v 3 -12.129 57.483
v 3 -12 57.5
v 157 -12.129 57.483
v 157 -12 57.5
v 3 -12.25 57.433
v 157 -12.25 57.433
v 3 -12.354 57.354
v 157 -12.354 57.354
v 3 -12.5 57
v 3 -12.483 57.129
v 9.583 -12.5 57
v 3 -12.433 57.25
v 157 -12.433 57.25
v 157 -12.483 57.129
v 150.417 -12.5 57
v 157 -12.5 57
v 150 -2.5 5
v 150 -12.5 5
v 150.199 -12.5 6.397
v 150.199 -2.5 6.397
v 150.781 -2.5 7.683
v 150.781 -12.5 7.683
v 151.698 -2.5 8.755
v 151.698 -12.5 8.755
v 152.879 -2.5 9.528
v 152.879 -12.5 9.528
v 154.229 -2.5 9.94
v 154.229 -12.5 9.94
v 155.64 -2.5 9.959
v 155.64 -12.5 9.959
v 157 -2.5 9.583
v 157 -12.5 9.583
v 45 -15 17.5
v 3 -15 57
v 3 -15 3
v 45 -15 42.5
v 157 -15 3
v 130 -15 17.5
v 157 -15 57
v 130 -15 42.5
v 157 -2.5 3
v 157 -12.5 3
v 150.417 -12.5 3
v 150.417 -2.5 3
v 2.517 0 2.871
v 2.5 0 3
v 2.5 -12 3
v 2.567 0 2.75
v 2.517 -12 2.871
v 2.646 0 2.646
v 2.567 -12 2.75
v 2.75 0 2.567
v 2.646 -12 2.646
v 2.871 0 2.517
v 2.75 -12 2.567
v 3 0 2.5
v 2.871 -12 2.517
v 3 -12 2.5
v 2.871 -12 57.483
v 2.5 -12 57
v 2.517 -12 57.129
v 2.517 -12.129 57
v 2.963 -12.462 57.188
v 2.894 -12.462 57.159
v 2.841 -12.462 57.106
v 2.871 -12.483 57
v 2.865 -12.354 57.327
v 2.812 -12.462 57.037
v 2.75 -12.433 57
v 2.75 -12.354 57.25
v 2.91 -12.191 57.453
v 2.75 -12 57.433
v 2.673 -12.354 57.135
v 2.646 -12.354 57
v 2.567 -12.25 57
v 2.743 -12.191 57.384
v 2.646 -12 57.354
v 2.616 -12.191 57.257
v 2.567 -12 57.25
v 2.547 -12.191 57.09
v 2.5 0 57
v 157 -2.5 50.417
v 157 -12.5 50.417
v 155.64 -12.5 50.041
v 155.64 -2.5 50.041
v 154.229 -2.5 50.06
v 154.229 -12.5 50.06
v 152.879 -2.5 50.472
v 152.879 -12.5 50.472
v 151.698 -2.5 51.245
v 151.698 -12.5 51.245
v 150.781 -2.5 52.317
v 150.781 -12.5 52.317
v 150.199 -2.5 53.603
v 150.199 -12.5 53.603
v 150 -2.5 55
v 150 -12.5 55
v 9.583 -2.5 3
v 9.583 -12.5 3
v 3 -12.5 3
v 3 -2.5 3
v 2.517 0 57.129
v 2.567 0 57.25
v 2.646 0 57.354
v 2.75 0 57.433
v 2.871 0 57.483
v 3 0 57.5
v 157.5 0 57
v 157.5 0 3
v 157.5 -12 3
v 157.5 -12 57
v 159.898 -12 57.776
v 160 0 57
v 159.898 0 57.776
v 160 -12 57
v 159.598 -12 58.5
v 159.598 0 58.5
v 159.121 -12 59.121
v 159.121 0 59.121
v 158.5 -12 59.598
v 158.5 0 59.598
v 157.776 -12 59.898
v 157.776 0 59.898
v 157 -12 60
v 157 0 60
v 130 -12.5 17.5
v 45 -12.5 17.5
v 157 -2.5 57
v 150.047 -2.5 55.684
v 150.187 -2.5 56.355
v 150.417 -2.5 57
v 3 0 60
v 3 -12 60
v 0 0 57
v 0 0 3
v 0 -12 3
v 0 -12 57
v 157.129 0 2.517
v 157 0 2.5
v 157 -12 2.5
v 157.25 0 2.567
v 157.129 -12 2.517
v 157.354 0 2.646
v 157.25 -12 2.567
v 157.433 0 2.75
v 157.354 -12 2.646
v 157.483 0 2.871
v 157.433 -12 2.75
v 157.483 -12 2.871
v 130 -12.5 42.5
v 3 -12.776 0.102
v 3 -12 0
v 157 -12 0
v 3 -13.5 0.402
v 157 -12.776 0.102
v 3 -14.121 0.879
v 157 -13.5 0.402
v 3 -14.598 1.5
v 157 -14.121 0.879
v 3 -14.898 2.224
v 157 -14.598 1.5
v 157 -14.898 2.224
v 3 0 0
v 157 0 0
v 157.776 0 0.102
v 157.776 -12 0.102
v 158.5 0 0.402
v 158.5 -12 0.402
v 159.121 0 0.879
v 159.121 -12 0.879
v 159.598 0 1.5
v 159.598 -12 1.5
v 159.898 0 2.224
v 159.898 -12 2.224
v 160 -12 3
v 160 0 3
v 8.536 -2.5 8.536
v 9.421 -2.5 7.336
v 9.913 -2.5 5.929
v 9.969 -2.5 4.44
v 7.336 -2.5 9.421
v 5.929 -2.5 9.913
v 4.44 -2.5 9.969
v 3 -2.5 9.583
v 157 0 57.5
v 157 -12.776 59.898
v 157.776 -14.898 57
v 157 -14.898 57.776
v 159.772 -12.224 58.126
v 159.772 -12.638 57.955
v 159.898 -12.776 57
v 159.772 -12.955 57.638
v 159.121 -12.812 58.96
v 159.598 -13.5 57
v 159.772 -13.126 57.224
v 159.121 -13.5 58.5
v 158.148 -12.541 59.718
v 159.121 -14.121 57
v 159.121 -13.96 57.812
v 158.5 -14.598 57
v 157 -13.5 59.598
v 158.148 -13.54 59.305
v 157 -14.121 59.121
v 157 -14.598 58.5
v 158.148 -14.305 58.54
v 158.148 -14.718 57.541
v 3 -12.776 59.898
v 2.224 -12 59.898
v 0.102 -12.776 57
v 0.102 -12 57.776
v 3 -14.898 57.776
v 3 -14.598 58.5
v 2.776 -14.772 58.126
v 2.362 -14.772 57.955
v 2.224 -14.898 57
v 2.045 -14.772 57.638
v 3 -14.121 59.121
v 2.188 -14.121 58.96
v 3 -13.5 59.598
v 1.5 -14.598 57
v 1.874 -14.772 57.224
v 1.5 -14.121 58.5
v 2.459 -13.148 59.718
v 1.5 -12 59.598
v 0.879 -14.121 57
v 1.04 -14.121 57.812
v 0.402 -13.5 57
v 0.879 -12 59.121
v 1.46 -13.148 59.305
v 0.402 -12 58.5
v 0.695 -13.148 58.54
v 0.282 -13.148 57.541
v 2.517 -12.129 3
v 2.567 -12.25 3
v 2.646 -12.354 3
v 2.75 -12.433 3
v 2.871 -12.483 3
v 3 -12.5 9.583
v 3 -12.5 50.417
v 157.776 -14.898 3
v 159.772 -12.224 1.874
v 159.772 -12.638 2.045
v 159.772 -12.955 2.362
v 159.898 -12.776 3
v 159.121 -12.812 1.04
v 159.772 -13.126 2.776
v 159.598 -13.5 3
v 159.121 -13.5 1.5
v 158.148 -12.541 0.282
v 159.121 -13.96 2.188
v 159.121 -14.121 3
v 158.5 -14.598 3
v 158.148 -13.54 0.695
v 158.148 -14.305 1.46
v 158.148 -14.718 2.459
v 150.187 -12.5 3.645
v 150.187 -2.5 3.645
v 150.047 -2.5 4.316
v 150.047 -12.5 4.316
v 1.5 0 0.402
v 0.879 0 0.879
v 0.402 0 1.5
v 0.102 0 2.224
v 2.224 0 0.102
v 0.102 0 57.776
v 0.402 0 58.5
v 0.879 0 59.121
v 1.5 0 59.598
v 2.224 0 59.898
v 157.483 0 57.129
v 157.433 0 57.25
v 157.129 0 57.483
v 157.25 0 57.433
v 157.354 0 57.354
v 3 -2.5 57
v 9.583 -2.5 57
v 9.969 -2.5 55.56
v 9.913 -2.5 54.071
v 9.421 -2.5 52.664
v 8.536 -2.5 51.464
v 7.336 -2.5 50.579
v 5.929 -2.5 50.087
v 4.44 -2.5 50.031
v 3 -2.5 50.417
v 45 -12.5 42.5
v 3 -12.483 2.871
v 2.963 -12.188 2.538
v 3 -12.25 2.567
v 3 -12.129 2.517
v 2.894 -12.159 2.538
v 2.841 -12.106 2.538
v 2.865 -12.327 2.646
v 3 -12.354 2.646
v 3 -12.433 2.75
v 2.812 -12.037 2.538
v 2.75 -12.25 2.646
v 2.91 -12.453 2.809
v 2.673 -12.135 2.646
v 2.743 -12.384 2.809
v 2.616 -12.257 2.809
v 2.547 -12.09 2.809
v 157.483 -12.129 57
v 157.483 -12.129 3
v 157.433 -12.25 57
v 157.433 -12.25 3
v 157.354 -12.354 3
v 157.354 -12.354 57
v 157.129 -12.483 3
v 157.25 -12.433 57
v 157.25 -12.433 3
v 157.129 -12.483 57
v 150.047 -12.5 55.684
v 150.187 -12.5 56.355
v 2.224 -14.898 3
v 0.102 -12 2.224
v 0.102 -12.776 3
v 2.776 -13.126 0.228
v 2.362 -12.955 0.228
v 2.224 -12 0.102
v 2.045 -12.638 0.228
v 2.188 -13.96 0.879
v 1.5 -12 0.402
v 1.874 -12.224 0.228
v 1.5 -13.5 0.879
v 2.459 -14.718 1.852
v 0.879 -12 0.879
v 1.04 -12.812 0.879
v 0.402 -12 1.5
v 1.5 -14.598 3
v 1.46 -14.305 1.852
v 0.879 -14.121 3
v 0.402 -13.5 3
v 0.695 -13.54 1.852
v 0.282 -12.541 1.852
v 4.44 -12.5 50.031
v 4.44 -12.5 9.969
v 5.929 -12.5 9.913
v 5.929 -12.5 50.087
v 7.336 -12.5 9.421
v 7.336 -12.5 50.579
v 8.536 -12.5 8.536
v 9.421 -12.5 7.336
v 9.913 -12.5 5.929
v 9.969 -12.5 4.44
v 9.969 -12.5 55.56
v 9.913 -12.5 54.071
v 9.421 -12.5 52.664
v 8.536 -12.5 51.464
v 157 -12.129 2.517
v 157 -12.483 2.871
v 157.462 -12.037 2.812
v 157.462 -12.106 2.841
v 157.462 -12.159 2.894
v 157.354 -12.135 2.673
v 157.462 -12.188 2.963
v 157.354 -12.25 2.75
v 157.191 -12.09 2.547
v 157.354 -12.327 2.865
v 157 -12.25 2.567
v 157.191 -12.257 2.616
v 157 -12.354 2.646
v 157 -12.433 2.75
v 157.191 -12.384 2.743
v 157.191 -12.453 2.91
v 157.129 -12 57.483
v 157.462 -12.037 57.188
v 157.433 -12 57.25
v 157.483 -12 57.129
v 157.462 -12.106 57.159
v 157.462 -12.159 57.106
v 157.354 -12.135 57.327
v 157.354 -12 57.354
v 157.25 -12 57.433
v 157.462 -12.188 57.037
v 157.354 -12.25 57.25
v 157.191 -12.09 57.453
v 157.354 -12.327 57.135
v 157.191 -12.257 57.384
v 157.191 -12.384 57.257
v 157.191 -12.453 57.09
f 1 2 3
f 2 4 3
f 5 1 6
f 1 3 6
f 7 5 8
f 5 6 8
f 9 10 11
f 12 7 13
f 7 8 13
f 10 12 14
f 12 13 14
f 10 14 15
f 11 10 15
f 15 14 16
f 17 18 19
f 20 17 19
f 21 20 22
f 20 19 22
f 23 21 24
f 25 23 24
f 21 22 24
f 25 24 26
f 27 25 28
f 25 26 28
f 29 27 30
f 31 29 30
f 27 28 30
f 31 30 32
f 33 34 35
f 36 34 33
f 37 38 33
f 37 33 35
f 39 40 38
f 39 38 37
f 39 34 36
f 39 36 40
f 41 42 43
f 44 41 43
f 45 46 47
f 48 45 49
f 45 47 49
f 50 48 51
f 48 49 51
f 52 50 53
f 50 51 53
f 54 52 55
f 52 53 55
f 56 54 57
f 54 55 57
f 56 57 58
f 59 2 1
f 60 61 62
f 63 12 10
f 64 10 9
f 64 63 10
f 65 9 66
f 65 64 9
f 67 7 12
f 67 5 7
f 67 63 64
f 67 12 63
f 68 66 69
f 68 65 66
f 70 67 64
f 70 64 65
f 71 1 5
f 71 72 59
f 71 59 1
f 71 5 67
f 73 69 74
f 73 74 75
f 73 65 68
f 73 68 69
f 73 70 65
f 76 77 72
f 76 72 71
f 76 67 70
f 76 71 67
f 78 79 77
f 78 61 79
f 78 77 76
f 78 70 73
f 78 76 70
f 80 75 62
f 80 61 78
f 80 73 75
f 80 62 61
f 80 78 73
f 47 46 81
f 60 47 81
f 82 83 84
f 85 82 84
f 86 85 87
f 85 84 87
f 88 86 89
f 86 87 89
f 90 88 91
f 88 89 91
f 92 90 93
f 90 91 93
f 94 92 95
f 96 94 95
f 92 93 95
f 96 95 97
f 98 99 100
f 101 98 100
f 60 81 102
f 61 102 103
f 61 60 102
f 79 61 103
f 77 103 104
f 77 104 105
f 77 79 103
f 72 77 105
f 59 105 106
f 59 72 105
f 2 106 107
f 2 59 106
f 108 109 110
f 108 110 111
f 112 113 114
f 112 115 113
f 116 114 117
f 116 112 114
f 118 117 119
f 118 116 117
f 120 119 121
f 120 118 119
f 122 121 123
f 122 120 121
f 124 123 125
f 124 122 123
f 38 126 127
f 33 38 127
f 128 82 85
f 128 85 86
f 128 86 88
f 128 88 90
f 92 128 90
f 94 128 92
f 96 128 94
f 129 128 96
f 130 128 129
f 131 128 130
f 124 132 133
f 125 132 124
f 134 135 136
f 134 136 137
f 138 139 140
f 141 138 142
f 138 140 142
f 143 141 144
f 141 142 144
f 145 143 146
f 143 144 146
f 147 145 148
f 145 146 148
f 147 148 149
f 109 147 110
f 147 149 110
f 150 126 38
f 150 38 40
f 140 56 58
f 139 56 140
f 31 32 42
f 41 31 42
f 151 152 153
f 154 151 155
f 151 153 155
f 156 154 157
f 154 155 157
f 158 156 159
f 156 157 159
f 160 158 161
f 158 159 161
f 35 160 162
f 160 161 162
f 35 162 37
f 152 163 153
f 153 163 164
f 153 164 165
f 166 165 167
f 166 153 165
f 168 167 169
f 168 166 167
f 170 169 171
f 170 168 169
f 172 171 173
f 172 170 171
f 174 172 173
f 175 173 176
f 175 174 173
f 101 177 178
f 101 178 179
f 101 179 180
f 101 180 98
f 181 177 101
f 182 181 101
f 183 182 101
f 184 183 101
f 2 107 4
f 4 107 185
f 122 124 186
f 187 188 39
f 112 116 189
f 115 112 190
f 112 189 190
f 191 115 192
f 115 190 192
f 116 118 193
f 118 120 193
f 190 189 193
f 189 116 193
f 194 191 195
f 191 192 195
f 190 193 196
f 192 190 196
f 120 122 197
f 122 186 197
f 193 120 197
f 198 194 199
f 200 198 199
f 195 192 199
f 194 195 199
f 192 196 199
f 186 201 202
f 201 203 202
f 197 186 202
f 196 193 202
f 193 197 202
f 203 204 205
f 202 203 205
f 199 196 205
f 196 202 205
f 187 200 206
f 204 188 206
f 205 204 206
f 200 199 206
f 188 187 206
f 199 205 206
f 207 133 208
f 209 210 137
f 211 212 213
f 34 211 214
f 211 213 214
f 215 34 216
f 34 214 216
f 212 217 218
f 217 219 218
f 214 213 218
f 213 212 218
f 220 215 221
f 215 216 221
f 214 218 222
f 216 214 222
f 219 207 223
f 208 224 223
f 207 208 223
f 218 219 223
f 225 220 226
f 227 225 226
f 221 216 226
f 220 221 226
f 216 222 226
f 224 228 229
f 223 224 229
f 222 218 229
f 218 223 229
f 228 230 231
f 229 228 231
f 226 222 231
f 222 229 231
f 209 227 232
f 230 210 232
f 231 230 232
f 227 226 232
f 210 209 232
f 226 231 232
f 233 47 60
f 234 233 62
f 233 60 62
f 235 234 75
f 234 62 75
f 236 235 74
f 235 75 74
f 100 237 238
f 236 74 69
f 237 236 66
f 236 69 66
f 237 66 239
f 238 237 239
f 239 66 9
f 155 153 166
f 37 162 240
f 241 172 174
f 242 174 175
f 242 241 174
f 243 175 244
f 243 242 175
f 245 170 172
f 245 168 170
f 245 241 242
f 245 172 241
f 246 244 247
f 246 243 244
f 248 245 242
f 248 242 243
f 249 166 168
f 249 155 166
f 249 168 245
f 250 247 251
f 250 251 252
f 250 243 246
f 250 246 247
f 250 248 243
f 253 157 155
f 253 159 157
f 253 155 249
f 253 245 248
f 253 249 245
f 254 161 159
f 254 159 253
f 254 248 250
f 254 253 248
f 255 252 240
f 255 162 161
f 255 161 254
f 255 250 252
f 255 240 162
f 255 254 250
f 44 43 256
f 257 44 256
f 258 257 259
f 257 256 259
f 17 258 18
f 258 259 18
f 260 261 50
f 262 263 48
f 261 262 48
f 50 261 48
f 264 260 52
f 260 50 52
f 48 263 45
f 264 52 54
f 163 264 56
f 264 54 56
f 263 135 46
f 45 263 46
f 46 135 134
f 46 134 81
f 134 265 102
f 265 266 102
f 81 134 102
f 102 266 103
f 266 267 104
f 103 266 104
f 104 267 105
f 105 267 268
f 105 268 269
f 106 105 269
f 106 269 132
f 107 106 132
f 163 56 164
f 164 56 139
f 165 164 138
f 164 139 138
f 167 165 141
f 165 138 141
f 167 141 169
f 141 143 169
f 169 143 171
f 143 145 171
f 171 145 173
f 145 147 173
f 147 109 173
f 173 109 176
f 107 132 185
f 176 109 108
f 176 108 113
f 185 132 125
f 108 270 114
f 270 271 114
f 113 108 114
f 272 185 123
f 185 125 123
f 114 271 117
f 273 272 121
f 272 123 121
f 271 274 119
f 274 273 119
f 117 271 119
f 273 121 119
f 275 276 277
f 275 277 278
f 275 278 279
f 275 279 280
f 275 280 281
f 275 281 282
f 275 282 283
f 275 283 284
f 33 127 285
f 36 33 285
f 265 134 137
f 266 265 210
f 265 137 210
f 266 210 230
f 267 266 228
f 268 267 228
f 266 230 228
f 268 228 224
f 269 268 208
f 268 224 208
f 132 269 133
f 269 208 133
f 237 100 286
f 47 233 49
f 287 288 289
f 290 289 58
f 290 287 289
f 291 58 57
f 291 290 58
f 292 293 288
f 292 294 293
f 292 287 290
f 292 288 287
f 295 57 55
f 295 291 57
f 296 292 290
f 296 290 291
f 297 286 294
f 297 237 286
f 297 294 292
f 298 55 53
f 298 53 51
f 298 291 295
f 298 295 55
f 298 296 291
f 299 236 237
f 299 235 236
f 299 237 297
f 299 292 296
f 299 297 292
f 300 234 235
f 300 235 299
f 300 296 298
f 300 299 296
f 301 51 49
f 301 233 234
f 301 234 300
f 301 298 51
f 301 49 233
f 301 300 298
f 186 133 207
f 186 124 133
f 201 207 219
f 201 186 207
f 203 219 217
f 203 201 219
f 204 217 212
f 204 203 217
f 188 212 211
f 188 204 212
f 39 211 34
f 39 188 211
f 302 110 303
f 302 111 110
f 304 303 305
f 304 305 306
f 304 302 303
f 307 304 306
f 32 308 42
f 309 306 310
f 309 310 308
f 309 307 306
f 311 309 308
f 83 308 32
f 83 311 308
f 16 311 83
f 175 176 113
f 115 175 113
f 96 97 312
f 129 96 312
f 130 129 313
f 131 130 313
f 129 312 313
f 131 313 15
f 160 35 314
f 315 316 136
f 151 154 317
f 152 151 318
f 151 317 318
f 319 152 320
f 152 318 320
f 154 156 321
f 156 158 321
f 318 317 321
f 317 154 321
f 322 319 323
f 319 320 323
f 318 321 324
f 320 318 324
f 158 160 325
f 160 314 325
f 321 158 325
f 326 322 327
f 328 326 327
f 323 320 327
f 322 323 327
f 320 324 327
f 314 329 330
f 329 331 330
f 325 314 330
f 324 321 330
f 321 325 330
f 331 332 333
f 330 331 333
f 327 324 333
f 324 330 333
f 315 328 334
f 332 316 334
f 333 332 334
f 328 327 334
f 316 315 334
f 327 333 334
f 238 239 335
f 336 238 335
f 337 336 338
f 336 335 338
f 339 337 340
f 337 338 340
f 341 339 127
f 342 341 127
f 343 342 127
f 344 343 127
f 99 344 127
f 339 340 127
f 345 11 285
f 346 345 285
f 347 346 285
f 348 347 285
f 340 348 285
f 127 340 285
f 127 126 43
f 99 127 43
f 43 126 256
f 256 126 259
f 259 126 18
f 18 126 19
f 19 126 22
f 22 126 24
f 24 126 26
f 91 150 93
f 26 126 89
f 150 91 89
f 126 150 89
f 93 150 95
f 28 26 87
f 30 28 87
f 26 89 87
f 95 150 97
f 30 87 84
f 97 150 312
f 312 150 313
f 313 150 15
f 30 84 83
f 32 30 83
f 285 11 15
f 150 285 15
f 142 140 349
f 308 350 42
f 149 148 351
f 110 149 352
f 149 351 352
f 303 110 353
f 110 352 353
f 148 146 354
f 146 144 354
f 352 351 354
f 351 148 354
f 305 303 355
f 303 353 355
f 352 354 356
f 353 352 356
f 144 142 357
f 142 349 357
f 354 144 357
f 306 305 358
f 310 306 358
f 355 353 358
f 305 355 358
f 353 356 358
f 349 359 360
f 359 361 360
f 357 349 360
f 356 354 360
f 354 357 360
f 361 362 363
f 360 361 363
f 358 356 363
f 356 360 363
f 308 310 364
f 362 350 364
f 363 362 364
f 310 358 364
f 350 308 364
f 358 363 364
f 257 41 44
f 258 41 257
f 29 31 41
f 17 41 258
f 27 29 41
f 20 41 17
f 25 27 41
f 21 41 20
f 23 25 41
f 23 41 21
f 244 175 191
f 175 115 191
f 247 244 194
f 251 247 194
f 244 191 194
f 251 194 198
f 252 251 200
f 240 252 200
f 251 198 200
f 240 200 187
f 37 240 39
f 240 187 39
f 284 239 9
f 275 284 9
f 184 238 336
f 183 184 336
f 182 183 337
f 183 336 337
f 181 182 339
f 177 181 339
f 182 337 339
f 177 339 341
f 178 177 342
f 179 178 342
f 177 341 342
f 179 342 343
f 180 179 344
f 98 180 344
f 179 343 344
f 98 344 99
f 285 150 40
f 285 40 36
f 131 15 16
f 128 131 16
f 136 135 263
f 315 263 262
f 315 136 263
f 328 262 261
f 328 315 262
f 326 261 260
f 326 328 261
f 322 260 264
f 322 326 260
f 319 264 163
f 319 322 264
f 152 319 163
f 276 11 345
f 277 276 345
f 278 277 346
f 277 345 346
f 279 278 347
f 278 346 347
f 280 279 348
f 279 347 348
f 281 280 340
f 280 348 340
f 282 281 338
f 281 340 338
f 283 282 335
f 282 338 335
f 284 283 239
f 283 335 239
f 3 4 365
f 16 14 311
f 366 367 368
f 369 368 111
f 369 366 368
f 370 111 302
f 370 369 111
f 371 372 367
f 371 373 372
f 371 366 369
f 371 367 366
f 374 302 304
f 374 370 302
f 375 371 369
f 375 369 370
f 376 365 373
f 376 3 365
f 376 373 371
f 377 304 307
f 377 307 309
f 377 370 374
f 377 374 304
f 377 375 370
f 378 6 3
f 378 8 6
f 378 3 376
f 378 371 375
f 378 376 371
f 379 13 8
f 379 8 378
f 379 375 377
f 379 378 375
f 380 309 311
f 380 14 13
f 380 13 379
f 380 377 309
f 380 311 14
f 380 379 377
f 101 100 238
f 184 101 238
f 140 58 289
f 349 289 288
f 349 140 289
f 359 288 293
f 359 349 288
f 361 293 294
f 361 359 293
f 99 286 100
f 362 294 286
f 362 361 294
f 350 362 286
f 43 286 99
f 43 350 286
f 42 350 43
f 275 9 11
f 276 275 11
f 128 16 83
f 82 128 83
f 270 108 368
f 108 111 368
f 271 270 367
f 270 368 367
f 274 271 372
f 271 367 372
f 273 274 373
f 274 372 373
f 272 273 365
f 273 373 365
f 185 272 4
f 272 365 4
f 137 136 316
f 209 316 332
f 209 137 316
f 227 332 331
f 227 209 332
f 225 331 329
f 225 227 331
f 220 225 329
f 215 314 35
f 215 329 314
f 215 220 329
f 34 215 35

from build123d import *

# Parameters (mm, degrees)
F0_W     = 160
F0_H     = 60
F1_DEPTH = 15
F2_R     = 3
F3_T     = -2.5
F5_DEPTH = 10
F6_W     = 85
F6_H     = 25
F7_DEPTH = 25


with BuildPart() as f1:
    # F0 (on Front) → F1 (new body)
    with BuildSketch(Plane.XZ):
        with Locations((80, 30)):
            Rectangle(F0_W, F0_H)
    extrude(amount=F1_DEPTH)

    # F2
    f2_edges = [f1.edges().sort_by_distance(p)[0] for p in [
        (0, -7.5, 60),
        (80, -15, 60),
        (0, -15, 30),
        (80, -15, 0),
        (0, -7.5, 0),
        (160, -7.5, 0),
        (160, -7.5, 60),
        (160, -15, 30),
    ]]
    fillet(f2_edges, radius=F2_R)

    # F3
    f3_openings = [f1.faces().sort_by_distance(p)[0] for p in [
        (80, 0, 30),
    ]]
    offset(amount=F3_T, openings=f3_openings)

    # F4 (on face) → F5 (join)
    with BuildSketch(Plane(origin=(0, -12.5, 0), x_dir=(-1, 0, 0), z_dir=(0, 1, 0))):
        with BuildLine():
            ThreePointArc((-157, 50.417424305), (-152.2613872125, 50.8166998673), (-150, 55))
            ThreePointArc((-150, 55), (-150.1054684353, 56.0215482184), (-150.417424305, 57))
            Line((-150.417424305, 57), (-157, 57))
            Line((-157, 57), (-157, 50.417424305))
        make_face()
        with BuildLine():
            Line((-3, 57), (-9.582575695, 57))
            ThreePointArc((-9.582575695, 57), (-8.5355339059, 51.4644660941), (-3, 50.417424305))
            Line((-3, 50.417424305), (-3, 57))
        make_face()
        with BuildLine():
            ThreePointArc((-150, 5), (-152.2613872125, 9.1833001327), (-157, 9.582575695))
            Line((-157, 9.582575695), (-157, 3))
            Line((-157, 3), (-150.417424305, 3))
            ThreePointArc((-150.417424305, 3), (-150.1054684353, 3.9784517816), (-150, 5))
        make_face()
        with BuildLine():
            Line((-3, 3), (-3, 9.582575695))
            ThreePointArc((-3, 9.582575695), (-8.5355339059, 8.5355339059), (-9.582575695, 3))
            Line((-9.582575695, 3), (-3, 3))
        make_face()
    extrude(amount=F5_DEPTH)

    # F6 (on face) → F7 (cut)
    with BuildSketch(Plane(origin=(0, -12.5, 0), x_dir=(-1, 0, 0), z_dir=(0, 1, 0))):
        with Locations((-87.5, 30)):
            Rectangle(F6_W, F6_H)
    extrude(amount=-F7_DEPTH, mode=Mode.SUBTRACT)


solid = f1.part
